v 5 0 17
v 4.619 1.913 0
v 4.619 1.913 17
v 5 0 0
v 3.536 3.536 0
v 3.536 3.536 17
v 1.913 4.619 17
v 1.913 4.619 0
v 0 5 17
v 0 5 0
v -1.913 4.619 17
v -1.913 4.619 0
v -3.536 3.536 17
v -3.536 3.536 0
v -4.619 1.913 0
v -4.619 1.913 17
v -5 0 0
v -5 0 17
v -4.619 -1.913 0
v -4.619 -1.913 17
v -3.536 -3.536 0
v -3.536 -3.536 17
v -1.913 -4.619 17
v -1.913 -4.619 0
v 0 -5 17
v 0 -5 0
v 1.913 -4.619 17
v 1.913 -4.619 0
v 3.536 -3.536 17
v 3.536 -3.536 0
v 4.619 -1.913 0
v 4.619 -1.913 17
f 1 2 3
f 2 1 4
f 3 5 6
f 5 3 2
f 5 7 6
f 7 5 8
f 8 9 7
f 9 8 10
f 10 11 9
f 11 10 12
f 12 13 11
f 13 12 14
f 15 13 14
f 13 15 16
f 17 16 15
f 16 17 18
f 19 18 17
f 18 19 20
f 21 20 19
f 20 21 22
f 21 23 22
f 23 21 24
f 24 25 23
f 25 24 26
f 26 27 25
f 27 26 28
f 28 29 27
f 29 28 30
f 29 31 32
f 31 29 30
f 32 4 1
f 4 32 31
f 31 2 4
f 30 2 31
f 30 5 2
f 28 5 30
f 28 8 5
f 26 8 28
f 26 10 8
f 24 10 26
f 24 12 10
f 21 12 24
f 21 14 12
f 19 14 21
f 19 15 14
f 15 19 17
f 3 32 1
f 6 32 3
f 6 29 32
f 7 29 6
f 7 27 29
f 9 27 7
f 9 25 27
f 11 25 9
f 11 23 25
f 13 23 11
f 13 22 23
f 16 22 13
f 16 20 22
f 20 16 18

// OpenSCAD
// Generated by SolidPython 1.0.1 on 2020-07-29 00:46:45


cylinder(h = 17, r1 = 5, r2 = 5);
/***********************************************
*********      SolidPython code:      **********
************************************************
 
# import packages: SolidPython
from solid import *
from solid.utils import *
from itertools import chain, combinations, permutations


class Resize:

    def __init__(self, scad_file):
        self.scad_file = scad_file
        #self.scad_file = import_scad(scad_file)
        # cone/cylinder param:
        self.r1 = 0
        self.r2 = 0
        self.h = 0
        # rectangular prism param:
        self.w = 0
        self.l = 0
        # ellipse param:
        self.r = 0

    # import OpenScad code (file name corresponds to shape)


    # classify shape + parameters
    def assign(self, param1, param2, param3):
        if self.scad_file == 'cone.scad':
            self.r1 = param1
            self.r2 = param2
            self.h = param3
        elif self.scad_file == 'cylinder.scad':
            self.r1 = param1
            self.r2 = param2
            self.h = param3
        elif self.scad_file == 'rectangularPrism.scad':
            self.h = param1
            self.l = param2
            self.w = param3
        else:
            self.r = param1
            self.h = param2

    # resize parameters
    def iterate(self):
        x = range(3, 20, 2)
        i = 1
        if self.scad_file == 'cone.scad':
            tempList = list(permutations(x, 2))
            for temp in tempList:
                param1 = temp[0]
                param2 = temp[1]
                filepath = 'produced_scad_files/' + 'cone' + str(param1) + '_' + str(param2) + '_' + '.scad'
                scad_render_to_file(cylinder(h=param1, r1=param2, r2=0), filepath)

        elif self.scad_file == 'cylinder.scad':
            tempList = list(permutations(x, 3))
            for temp in tempList:
                param1 = temp[0]
                param2 = temp[1]
                filepath = 'produced_scad_files/' + 'cylinder' + str(param1) + '_' + str(param2) + '_' + '.scad'
                scad_render_to_file(cylinder(h=param1, r1=param2, r2=param2), filepath)

        elif self.scad_file == 'rectangularPrism.scad':
            tempList = list(permutations(x, 3))
            for temp in tempList:
                param1 = temp[0]
                param2 = temp[1]
                param3 = temp[2]
                filepath = 'produced_scad_files/' + 'rectangularPrism' + str(param1) + '_' + str(param2) + '_' + str(
                    param3) + '.scad'
                scad_render_to_file(cube(size=(param1, param2, param3)), filepath)

        elif self.scad_file == 'ellipse.scad':
            tempList = list(permutations(x, 4))
            for temp in tempList:
                param1 = temp[0]
                param2 = temp[1]
                param3 = temp[2]
                param4 = temp[3]
                filepath = 'produced_scad_files/' + 'ellipse' + str(param1) + '_' + str(param2) + '_' + str(param3) + '_' + str(param4) + '.scad'
                scad_render_to_file(scale([param1, param2, param3])(sphere(r=param4)), filepath)

    def render_to_scadfile(self):
        scad_render_to_file(scad, 'example.scad') 
 
************************************************/
